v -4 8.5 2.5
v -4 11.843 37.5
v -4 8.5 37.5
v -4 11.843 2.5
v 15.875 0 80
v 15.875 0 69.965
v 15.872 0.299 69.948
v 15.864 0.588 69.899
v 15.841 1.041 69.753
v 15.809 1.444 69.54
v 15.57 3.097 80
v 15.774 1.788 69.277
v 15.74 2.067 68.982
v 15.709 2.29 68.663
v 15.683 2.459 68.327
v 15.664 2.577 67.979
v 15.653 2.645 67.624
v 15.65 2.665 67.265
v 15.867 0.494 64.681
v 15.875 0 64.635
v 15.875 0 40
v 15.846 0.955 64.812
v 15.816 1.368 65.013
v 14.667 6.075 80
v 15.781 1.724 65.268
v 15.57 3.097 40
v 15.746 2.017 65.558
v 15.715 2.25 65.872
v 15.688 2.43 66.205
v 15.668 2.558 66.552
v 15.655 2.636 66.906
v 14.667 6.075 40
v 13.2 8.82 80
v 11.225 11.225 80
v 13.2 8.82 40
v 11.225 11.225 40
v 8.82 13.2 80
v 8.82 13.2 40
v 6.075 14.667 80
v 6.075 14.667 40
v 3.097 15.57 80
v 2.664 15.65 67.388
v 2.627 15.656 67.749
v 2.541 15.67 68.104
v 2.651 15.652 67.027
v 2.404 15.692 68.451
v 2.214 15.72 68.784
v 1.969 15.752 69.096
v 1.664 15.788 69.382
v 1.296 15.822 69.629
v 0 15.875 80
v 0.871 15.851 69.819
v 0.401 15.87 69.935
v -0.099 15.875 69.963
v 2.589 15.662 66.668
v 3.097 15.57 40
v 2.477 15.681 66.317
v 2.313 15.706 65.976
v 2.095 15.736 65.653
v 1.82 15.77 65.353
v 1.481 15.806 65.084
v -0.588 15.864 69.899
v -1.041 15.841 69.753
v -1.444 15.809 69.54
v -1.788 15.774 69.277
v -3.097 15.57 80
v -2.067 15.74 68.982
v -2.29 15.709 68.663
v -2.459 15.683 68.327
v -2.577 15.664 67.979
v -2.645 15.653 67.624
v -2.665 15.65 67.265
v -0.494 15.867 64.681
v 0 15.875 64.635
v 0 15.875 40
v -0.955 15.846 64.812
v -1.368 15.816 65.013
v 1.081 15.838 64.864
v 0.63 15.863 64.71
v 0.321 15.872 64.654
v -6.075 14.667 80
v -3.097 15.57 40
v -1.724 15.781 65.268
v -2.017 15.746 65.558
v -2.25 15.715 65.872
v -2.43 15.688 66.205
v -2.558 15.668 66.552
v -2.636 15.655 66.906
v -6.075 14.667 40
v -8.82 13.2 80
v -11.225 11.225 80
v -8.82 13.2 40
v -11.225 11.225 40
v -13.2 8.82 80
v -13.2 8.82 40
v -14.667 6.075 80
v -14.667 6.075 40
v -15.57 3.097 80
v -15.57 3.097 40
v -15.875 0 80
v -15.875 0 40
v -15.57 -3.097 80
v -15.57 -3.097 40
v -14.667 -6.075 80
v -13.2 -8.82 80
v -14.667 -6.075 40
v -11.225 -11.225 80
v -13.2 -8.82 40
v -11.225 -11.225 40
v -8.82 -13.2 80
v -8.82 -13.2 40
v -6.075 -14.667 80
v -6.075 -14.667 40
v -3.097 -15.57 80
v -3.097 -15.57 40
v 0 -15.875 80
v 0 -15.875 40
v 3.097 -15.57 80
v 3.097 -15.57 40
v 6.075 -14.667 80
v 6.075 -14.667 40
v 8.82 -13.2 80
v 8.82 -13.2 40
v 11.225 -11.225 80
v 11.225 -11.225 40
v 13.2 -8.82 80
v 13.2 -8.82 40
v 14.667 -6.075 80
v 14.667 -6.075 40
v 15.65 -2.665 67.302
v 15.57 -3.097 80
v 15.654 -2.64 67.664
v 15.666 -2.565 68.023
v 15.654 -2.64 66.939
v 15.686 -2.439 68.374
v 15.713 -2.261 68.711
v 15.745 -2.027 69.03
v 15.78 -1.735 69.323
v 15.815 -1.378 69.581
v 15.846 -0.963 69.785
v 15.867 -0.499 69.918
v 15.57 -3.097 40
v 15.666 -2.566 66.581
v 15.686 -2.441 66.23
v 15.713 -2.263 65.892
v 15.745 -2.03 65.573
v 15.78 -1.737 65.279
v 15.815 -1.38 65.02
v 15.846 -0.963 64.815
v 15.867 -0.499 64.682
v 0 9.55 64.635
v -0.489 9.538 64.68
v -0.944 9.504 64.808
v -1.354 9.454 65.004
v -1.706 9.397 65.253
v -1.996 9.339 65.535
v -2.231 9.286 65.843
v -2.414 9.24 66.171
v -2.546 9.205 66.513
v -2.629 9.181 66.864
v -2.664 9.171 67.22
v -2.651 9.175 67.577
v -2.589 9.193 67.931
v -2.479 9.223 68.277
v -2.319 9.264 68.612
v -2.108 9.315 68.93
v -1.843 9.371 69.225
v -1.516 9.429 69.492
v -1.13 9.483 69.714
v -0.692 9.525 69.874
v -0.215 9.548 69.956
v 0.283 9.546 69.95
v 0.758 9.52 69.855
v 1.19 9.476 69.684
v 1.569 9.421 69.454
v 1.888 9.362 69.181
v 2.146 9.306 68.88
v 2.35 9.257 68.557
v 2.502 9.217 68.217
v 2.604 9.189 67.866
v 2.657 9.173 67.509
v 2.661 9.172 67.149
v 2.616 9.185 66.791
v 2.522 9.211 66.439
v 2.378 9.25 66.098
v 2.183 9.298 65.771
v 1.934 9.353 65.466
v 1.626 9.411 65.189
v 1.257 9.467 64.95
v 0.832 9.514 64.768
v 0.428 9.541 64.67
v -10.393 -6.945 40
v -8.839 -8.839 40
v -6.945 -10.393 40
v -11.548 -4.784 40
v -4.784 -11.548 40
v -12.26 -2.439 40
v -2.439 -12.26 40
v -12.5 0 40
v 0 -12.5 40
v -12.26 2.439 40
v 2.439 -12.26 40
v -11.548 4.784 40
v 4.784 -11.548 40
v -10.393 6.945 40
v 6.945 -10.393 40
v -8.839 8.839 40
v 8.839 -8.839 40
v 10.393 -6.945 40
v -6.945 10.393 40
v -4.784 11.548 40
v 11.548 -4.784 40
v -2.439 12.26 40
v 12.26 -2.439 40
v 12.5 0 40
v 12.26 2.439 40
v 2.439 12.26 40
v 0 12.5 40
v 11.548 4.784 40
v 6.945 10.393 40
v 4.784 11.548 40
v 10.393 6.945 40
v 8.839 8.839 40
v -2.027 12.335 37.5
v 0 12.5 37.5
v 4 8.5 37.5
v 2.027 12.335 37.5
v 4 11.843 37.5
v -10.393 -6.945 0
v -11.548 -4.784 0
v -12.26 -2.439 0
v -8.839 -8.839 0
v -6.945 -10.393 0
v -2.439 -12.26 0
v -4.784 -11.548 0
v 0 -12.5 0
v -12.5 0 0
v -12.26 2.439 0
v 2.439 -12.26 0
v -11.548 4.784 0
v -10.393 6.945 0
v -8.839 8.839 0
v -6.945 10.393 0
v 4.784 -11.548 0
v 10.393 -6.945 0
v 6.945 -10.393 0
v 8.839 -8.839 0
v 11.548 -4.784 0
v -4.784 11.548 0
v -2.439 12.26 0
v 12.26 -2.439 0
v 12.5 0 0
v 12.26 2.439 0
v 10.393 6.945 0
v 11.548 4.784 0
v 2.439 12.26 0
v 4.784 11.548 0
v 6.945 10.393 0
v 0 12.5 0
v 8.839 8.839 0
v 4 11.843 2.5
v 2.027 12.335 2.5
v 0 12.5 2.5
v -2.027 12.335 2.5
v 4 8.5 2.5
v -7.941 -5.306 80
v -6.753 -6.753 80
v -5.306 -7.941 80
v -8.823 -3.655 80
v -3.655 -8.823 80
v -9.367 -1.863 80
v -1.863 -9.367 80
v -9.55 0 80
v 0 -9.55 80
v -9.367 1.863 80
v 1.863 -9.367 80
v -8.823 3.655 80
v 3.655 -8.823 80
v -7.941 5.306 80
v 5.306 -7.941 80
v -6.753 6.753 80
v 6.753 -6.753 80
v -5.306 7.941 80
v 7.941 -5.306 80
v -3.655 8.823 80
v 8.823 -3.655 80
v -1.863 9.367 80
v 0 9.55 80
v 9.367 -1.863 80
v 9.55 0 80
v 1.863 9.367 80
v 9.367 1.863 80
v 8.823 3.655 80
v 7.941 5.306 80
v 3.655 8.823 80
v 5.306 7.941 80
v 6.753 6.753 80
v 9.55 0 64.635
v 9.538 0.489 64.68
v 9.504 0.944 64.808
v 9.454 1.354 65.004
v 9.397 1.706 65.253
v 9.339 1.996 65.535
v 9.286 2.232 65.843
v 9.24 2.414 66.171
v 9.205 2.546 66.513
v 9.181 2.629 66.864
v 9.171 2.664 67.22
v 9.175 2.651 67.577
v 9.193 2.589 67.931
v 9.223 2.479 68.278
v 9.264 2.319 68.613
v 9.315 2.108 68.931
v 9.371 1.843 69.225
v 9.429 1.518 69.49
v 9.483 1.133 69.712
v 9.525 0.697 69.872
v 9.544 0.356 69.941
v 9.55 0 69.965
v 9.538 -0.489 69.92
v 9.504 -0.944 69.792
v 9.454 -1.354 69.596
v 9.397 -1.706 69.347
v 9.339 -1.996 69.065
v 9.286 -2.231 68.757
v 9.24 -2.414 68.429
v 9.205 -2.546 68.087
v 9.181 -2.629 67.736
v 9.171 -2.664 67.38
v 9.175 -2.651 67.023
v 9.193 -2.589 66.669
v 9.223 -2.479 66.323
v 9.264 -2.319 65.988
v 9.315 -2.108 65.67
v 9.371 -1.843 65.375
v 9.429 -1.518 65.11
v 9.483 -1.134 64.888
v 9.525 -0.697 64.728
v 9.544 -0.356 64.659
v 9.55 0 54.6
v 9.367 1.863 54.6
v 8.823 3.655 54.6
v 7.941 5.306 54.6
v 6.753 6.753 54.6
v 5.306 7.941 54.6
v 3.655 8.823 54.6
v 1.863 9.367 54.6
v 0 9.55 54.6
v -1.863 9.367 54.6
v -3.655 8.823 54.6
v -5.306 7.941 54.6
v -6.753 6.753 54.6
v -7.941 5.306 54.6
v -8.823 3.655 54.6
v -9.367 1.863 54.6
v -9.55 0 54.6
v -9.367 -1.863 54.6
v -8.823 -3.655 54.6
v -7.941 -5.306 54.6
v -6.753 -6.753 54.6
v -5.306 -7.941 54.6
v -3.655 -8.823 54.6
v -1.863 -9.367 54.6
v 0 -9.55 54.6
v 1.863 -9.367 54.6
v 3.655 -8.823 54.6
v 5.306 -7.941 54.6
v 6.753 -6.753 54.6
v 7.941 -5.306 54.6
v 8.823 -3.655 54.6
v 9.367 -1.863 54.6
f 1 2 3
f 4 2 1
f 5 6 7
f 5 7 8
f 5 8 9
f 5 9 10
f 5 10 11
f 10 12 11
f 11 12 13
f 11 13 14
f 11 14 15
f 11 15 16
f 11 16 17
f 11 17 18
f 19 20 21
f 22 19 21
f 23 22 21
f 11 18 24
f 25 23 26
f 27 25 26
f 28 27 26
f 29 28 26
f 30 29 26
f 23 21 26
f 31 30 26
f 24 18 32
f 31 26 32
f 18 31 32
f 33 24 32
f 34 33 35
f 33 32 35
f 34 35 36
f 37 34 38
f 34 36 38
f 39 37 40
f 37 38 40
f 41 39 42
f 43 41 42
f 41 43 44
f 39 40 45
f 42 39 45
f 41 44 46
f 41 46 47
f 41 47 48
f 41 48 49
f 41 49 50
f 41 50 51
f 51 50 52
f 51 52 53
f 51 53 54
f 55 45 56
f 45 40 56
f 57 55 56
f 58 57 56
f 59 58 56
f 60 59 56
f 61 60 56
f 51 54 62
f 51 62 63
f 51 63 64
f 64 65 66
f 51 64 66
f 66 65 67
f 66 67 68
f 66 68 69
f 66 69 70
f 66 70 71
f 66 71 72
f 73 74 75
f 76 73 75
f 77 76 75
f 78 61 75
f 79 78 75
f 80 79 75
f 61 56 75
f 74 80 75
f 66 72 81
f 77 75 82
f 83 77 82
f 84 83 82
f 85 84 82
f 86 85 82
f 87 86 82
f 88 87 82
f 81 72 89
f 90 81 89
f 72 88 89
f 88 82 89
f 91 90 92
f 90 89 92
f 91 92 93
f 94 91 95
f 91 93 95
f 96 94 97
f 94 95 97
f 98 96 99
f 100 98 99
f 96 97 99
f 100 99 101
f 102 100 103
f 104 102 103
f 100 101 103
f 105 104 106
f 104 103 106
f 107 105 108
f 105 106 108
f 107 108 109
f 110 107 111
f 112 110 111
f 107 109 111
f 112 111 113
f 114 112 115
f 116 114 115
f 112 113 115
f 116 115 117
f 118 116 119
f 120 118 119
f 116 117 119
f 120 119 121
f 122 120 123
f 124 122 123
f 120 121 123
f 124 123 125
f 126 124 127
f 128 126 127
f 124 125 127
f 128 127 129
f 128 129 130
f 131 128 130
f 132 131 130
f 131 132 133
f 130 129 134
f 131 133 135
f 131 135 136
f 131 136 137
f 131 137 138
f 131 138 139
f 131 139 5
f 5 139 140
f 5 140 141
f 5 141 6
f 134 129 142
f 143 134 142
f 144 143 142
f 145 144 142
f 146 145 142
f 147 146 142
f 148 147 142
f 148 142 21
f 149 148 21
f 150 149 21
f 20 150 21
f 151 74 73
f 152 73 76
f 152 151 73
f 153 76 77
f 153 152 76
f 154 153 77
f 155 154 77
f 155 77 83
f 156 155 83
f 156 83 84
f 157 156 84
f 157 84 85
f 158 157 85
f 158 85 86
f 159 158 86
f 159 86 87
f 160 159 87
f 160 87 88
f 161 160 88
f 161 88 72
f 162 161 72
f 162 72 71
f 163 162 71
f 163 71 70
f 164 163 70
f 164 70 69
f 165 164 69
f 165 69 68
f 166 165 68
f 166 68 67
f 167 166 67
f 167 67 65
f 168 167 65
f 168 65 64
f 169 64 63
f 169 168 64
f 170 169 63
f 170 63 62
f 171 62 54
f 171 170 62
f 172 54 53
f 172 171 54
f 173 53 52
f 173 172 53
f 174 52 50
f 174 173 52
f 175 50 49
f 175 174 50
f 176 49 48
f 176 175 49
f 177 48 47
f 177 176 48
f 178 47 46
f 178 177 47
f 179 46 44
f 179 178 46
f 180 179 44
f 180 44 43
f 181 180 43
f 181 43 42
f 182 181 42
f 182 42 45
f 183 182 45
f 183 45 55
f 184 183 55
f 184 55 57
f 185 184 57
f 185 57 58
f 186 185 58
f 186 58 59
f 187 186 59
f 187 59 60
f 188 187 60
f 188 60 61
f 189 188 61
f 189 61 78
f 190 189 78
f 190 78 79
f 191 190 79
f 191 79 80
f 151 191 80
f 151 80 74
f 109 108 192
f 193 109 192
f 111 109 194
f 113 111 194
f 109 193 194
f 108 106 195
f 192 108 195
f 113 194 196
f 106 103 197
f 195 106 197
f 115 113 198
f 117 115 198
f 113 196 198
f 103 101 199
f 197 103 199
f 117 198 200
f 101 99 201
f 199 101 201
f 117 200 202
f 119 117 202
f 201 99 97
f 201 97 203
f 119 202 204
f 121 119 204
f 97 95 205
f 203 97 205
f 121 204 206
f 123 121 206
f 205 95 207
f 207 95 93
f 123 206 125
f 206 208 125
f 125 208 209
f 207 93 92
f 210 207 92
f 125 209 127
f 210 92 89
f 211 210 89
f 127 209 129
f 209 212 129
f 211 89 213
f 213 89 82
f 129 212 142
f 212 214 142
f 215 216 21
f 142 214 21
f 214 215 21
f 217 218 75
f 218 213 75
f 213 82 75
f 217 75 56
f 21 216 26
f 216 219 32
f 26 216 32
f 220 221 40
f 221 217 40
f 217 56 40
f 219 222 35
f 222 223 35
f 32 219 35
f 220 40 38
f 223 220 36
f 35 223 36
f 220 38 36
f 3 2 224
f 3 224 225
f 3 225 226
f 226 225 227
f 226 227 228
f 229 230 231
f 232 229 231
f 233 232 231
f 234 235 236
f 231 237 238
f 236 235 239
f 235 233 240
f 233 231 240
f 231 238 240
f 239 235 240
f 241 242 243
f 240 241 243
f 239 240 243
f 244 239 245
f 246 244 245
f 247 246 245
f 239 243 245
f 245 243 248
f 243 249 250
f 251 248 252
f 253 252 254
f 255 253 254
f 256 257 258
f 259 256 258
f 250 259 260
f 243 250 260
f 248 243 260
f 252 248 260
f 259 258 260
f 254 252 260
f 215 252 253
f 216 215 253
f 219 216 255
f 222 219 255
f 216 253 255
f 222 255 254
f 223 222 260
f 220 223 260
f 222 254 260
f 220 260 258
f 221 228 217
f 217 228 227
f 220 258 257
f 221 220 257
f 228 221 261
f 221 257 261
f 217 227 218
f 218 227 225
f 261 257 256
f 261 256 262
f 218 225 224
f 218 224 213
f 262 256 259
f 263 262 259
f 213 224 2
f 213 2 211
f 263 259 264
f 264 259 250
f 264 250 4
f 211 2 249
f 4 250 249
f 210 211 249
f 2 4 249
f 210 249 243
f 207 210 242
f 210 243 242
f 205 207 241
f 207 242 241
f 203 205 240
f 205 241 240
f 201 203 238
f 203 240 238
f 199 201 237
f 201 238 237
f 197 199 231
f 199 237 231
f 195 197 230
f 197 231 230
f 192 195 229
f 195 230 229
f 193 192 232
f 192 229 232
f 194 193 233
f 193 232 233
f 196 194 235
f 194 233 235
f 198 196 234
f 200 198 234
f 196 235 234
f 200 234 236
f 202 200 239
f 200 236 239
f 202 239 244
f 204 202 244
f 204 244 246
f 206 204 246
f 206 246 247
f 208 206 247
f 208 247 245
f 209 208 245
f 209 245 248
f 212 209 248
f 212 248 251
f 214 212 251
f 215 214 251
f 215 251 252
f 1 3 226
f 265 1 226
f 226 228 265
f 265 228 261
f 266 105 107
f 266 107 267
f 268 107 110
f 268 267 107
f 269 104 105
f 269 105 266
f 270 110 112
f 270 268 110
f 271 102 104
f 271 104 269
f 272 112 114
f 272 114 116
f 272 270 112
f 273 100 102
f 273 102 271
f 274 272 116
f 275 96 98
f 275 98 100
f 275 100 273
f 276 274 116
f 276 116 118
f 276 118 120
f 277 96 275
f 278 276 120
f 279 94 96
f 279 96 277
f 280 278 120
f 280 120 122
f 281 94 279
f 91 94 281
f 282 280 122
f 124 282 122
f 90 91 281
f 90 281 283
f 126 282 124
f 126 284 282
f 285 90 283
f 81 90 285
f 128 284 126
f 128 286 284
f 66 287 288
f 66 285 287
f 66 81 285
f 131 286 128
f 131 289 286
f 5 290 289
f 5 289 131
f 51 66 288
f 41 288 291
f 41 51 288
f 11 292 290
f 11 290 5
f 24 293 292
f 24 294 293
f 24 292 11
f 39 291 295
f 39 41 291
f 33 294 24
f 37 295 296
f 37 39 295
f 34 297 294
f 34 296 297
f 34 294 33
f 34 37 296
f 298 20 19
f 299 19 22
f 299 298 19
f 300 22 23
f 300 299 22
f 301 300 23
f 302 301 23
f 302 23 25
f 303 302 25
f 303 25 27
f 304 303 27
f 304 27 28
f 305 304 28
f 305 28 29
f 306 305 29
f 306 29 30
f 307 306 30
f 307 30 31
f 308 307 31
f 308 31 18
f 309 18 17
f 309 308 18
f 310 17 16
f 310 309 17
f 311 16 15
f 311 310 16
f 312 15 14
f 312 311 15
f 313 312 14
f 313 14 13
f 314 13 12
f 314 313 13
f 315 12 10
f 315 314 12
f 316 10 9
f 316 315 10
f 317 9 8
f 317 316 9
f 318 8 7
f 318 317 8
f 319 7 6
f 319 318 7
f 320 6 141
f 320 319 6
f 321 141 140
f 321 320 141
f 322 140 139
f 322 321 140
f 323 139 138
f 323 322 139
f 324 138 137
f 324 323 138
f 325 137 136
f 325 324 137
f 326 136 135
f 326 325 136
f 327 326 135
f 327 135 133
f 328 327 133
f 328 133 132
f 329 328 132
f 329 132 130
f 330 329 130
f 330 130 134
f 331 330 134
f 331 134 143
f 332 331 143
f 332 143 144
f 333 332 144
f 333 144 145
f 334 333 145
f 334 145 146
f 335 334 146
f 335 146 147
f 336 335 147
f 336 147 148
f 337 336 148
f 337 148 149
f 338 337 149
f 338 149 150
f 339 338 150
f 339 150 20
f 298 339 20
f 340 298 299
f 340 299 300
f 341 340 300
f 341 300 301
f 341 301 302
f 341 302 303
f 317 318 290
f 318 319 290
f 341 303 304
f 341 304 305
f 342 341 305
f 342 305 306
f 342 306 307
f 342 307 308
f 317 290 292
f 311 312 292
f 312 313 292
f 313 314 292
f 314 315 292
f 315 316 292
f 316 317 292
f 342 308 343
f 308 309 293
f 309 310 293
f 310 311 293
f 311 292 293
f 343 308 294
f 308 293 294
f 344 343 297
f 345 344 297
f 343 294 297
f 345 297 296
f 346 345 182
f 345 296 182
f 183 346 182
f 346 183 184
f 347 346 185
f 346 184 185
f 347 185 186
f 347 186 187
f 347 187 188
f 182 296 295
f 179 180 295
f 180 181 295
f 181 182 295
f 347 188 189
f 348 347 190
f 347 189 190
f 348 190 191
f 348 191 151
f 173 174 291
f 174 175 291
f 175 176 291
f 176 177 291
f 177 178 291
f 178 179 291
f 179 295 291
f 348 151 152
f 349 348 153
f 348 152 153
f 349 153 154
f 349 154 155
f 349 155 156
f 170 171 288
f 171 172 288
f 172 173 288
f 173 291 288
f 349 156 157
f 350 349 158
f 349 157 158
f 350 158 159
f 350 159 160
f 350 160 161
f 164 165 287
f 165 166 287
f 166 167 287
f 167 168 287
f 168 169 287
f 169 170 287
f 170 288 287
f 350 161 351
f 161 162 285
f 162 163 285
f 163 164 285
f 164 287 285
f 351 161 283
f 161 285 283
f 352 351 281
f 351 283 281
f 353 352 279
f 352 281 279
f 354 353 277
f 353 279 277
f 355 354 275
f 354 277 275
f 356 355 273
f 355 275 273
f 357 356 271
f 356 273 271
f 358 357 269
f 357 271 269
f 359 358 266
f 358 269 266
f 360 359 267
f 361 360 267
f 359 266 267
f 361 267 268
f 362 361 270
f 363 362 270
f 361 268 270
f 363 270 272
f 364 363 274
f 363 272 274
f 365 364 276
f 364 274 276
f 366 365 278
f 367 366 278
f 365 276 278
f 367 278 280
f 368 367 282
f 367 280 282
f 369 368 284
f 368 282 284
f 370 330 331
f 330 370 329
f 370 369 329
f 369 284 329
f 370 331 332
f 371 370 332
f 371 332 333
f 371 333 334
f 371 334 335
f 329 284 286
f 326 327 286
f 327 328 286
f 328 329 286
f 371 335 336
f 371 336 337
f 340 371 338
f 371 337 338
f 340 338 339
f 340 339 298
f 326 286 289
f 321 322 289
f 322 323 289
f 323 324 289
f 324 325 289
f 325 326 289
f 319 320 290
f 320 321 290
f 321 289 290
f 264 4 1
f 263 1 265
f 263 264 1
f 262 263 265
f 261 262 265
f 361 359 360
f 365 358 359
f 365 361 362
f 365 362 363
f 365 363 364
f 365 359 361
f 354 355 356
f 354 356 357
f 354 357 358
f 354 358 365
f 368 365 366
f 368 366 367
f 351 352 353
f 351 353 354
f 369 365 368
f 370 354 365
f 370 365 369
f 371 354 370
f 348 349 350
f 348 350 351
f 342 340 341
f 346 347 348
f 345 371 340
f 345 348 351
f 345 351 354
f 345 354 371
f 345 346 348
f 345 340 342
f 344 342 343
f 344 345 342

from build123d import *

# Parameters (mm, degrees)
SKETCH1_R               = 12.5
BOSS_EXTRUDE1_DEPTH     = 40
SKETCH2_W               = 8
SKETCH2_H               = 35
CUT_EXTRUDE1_DEPTH      = 4
SKETCH3_R               = 15.875
BOSS_EXTRUDE2_DEPTH     = 40
SKETCH5_R               = 9.5504
CUT_EXTRUDE2_DEPTH      = 25.4
CUT_EXTRUDE3_REACH      = 85.091
CUT_EXTRUDE3_END_RADIUS = 15.875
SKETCH6_R               = 2.665
CIRPATTERN1_COUNT       = 2
CIRPATTERN1_ANGLE       = 90


with BuildPart() as part:
    # Sketch1 → Boss-Extrude1 (new body)
    with BuildSketch(Plane.XY):
        Circle(SKETCH1_R)
    extrude(amount=BOSS_EXTRUDE1_DEPTH)

    # Sketch2 → Cut-Extrude1 (cut)
    with BuildSketch(Plane(origin=(0, 12.5, 0), x_dir=(1, 0, 0), z_dir=(0, 1, 0))):
        with Locations((0, -20)):
            Rectangle(SKETCH2_W, SKETCH2_H)
    extrude(amount=-CUT_EXTRUDE1_DEPTH, mode=Mode.SUBTRACT)

    # Sketch3 → Boss-Extrude2 (add)
    with BuildSketch(Plane.XY.offset(40)):
        Circle(SKETCH3_R)
    extrude(amount=BOSS_EXTRUDE2_DEPTH)

    # Sketch5 → Cut-Extrude2 (cut)
    with BuildSketch(Plane.XY.offset(80)):
        Circle(SKETCH5_R)
    extrude(amount=-CUT_EXTRUDE2_DEPTH, mode=Mode.SUBTRACT)

    # Cut-Extrude3: up to this cylinder (the profile starts inside it)
    cut_extrude3_end = Plane(origin=(0, 0, 67.3), z_dir=(0, 0, -1)) * Cylinder(CUT_EXTRUDE3_END_RADIUS, 202.932, mode=Mode.PRIVATE)
    # Sketch6 → Cut-Extrude3 (cut, up to the surface)
    with BuildSketch(Plane(origin=(0, 0, 0), x_dir=(1, 0, 0), z_dir=(0, 1, 0)), mode=Mode.PRIVATE) as cut_extrude3_sk1:
        with Locations(Location((0, -67.3, 0), (0, 0, 90))):
            Circle(SKETCH6_R)
    cut_extrude3_tool1 = extrude(cut_extrude3_sk1.sketch, amount=CUT_EXTRUDE3_REACH, mode=Mode.PRIVATE) & cut_extrude3_end
    cut_extrude3 = cut_extrude3_tool1.solids().sort_by_distance((0, 0, 67.3))[0]
    add(cut_extrude3, mode=Mode.SUBTRACT)

    # CirPattern1: Cut-Extrude3 ×2 about axis
    cirpattern1_axis = Axis((0, 0, 80), (0, 0, -1))
    for i in range(1, CIRPATTERN1_COUNT):
        add(cut_extrude3.rotate(cirpattern1_axis, i * CIRPATTERN1_ANGLE / (CIRPATTERN1_COUNT - 1)), mode=Mode.SUBTRACT)


solid = part.part
